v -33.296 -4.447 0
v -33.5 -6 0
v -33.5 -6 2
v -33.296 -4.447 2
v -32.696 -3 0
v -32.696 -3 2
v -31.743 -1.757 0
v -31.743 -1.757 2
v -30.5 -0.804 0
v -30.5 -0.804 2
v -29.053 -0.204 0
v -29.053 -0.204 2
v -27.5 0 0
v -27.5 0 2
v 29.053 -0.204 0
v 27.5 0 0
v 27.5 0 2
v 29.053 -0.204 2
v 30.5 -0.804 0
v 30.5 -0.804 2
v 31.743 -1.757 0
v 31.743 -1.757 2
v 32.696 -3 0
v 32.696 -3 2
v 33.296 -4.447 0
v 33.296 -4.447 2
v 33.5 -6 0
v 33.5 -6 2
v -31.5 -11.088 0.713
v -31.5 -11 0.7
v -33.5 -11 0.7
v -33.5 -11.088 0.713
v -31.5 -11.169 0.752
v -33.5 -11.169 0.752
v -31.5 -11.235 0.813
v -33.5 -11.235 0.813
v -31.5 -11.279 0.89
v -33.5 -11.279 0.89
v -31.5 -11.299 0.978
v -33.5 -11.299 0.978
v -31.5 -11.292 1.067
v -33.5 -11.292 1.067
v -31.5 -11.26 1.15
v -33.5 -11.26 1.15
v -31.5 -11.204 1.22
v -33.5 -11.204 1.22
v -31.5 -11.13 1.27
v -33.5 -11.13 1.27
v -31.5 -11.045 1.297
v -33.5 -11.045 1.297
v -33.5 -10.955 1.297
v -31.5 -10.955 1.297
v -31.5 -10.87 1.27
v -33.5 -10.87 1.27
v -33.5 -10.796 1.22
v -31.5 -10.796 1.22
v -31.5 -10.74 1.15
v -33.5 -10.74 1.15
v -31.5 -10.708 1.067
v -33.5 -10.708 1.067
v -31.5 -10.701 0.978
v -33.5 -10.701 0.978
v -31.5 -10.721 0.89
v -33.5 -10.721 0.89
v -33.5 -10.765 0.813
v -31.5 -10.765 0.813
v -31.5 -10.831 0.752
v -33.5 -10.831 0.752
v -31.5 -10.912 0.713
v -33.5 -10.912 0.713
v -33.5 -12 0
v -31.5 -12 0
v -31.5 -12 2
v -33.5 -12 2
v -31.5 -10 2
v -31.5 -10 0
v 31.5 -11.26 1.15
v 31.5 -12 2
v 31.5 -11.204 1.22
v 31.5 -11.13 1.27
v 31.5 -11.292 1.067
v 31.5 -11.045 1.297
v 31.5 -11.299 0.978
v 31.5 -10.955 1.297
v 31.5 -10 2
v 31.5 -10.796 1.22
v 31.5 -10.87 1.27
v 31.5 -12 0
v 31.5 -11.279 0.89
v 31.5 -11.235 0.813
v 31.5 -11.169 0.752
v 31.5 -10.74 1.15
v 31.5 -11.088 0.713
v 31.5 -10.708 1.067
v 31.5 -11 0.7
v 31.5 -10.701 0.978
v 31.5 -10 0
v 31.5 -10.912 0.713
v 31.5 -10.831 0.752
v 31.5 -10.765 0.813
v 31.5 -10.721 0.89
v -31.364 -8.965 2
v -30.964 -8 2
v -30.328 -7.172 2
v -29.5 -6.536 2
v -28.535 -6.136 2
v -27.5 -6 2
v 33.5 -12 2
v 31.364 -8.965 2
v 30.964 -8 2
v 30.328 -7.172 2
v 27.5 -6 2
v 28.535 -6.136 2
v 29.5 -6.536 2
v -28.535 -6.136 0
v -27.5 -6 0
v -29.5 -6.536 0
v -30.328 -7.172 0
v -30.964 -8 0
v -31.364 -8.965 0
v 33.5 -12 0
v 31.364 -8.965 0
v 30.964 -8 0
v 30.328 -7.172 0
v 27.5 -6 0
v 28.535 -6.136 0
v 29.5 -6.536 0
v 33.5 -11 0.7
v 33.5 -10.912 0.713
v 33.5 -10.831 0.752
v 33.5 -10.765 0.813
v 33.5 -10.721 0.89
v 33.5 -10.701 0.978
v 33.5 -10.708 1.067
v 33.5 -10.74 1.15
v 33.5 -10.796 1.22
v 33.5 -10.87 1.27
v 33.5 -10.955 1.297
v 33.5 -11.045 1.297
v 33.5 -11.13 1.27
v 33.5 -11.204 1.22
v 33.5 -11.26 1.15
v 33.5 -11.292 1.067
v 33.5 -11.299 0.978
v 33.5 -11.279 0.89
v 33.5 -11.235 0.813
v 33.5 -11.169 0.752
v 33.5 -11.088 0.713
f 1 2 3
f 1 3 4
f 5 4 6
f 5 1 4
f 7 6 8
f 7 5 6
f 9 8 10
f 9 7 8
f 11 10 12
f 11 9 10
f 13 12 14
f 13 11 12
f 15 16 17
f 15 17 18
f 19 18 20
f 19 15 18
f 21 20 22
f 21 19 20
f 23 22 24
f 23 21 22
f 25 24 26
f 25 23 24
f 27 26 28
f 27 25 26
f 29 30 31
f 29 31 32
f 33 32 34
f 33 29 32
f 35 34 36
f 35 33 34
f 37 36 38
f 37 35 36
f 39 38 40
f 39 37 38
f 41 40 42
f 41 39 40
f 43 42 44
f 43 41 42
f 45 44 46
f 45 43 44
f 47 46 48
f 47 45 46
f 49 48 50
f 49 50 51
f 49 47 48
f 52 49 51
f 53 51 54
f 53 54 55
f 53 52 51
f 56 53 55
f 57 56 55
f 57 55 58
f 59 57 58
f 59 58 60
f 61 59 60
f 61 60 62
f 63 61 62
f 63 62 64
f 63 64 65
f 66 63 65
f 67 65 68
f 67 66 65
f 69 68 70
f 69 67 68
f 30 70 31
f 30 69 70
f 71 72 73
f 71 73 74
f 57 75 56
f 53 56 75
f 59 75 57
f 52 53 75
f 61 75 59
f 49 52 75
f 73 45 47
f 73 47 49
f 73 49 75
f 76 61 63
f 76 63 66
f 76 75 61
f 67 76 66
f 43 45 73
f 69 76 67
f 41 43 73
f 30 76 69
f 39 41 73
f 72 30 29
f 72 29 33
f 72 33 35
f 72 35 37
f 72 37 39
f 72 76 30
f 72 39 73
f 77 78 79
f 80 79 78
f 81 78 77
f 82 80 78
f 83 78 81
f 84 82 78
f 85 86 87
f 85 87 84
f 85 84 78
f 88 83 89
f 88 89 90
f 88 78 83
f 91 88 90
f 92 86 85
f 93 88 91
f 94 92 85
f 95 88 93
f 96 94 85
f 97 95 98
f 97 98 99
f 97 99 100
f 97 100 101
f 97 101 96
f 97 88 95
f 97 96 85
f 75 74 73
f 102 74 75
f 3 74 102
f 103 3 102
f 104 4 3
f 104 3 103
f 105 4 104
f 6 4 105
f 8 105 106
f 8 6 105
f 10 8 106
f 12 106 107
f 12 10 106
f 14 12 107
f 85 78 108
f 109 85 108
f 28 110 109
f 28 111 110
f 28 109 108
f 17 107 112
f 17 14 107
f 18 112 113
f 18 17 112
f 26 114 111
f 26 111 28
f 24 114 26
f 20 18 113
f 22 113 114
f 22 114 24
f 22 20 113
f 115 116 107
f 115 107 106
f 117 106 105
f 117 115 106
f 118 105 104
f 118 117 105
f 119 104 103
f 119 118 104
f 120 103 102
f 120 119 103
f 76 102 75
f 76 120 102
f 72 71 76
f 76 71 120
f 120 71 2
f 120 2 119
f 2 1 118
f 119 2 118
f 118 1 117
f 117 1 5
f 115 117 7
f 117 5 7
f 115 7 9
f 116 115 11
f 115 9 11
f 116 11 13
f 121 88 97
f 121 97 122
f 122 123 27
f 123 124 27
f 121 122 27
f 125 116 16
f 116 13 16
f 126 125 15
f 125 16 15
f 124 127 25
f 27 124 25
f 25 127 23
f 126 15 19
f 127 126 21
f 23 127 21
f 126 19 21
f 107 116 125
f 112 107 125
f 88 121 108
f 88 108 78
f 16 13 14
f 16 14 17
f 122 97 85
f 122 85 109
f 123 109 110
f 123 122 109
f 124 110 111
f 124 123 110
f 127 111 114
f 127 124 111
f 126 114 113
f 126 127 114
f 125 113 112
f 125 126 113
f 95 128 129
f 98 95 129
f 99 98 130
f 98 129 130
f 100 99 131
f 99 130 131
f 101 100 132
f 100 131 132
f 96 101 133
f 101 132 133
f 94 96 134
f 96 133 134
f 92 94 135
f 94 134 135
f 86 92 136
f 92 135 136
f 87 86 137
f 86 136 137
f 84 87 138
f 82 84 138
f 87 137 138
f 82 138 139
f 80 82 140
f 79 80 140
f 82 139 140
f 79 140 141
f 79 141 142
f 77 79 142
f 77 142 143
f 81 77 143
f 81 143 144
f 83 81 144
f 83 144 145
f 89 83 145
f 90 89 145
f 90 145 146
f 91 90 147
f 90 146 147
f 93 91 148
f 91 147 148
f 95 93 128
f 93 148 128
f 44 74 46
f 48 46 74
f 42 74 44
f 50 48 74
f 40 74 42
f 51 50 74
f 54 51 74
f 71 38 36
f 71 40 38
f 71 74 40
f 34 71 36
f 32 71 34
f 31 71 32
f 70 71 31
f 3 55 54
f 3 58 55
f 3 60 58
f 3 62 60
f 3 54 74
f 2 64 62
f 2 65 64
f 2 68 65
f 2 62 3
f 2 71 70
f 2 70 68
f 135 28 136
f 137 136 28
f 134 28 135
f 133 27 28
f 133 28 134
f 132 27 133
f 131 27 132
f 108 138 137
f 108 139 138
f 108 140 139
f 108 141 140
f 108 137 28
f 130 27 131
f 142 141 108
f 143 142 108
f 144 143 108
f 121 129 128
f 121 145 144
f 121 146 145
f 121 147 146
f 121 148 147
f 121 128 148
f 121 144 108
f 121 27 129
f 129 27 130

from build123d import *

# Parameters (mm, degrees)
BOSS_EXTRUDE8_DEPTH = 2
SKETCH4_R           = 0.3
CUT_EXTRUDE3_DEPTH  = 2
CUT_EXTRUDE4_START  = -2
SKETCH5_R           = 0.3
CUT_EXTRUDE4_DEPTH  = 2


with BuildPart() as part:
    # Sketch2 → Boss-Extrude8 (new body)
    with BuildSketch(Plane.XY):
        with BuildLine():
            Line((27.5, 0), (-27.5, 0))
            ThreePointArc((-27.5, 0), (-31.742640687, -1.757359313), (-33.5, -6))
            Line((-33.5, -6), (-33.5, -12))
            Line((-33.5, -12), (-31.5, -12))
            Line((-31.5, -12), (-31.5, -10))
            ThreePointArc((-31.5, -10), (-30.328427125, -7.171572875), (-27.5, -6))
            Line((-27.5, -6), (27.5, -6))
            ThreePointArc((27.5, -6), (30.328427125, -7.171572875), (31.5, -10))
            Line((31.5, -10), (31.5, -12))
            Line((31.5, -12), (33.5, -12))
            Line((33.5, -12), (33.5, -6))
            ThreePointArc((33.5, -6), (31.742640687, -1.757359313), (27.5, 0))
        make_face()
    extrude(amount=BOSS_EXTRUDE8_DEPTH)

    # Sketch4 → Cut-Extrude3 (cut)
    with BuildSketch(Plane(origin=(33.5, 0, 0), x_dir=(0, 0, -1), z_dir=(1, 0, 0))):
        with Locations((-1, -11)):
            Circle(SKETCH4_R)
    extrude(amount=-CUT_EXTRUDE3_DEPTH, mode=Mode.SUBTRACT)

    # Sketch5 → Cut-Extrude4 (cut)
    with BuildSketch(Plane.ZY.offset(33.5).offset(CUT_EXTRUDE4_START)):
        with Locations((1, -11)):
            Circle(SKETCH5_R)
    extrude(amount=CUT_EXTRUDE4_DEPTH, mode=Mode.SUBTRACT)


solid = part.part
